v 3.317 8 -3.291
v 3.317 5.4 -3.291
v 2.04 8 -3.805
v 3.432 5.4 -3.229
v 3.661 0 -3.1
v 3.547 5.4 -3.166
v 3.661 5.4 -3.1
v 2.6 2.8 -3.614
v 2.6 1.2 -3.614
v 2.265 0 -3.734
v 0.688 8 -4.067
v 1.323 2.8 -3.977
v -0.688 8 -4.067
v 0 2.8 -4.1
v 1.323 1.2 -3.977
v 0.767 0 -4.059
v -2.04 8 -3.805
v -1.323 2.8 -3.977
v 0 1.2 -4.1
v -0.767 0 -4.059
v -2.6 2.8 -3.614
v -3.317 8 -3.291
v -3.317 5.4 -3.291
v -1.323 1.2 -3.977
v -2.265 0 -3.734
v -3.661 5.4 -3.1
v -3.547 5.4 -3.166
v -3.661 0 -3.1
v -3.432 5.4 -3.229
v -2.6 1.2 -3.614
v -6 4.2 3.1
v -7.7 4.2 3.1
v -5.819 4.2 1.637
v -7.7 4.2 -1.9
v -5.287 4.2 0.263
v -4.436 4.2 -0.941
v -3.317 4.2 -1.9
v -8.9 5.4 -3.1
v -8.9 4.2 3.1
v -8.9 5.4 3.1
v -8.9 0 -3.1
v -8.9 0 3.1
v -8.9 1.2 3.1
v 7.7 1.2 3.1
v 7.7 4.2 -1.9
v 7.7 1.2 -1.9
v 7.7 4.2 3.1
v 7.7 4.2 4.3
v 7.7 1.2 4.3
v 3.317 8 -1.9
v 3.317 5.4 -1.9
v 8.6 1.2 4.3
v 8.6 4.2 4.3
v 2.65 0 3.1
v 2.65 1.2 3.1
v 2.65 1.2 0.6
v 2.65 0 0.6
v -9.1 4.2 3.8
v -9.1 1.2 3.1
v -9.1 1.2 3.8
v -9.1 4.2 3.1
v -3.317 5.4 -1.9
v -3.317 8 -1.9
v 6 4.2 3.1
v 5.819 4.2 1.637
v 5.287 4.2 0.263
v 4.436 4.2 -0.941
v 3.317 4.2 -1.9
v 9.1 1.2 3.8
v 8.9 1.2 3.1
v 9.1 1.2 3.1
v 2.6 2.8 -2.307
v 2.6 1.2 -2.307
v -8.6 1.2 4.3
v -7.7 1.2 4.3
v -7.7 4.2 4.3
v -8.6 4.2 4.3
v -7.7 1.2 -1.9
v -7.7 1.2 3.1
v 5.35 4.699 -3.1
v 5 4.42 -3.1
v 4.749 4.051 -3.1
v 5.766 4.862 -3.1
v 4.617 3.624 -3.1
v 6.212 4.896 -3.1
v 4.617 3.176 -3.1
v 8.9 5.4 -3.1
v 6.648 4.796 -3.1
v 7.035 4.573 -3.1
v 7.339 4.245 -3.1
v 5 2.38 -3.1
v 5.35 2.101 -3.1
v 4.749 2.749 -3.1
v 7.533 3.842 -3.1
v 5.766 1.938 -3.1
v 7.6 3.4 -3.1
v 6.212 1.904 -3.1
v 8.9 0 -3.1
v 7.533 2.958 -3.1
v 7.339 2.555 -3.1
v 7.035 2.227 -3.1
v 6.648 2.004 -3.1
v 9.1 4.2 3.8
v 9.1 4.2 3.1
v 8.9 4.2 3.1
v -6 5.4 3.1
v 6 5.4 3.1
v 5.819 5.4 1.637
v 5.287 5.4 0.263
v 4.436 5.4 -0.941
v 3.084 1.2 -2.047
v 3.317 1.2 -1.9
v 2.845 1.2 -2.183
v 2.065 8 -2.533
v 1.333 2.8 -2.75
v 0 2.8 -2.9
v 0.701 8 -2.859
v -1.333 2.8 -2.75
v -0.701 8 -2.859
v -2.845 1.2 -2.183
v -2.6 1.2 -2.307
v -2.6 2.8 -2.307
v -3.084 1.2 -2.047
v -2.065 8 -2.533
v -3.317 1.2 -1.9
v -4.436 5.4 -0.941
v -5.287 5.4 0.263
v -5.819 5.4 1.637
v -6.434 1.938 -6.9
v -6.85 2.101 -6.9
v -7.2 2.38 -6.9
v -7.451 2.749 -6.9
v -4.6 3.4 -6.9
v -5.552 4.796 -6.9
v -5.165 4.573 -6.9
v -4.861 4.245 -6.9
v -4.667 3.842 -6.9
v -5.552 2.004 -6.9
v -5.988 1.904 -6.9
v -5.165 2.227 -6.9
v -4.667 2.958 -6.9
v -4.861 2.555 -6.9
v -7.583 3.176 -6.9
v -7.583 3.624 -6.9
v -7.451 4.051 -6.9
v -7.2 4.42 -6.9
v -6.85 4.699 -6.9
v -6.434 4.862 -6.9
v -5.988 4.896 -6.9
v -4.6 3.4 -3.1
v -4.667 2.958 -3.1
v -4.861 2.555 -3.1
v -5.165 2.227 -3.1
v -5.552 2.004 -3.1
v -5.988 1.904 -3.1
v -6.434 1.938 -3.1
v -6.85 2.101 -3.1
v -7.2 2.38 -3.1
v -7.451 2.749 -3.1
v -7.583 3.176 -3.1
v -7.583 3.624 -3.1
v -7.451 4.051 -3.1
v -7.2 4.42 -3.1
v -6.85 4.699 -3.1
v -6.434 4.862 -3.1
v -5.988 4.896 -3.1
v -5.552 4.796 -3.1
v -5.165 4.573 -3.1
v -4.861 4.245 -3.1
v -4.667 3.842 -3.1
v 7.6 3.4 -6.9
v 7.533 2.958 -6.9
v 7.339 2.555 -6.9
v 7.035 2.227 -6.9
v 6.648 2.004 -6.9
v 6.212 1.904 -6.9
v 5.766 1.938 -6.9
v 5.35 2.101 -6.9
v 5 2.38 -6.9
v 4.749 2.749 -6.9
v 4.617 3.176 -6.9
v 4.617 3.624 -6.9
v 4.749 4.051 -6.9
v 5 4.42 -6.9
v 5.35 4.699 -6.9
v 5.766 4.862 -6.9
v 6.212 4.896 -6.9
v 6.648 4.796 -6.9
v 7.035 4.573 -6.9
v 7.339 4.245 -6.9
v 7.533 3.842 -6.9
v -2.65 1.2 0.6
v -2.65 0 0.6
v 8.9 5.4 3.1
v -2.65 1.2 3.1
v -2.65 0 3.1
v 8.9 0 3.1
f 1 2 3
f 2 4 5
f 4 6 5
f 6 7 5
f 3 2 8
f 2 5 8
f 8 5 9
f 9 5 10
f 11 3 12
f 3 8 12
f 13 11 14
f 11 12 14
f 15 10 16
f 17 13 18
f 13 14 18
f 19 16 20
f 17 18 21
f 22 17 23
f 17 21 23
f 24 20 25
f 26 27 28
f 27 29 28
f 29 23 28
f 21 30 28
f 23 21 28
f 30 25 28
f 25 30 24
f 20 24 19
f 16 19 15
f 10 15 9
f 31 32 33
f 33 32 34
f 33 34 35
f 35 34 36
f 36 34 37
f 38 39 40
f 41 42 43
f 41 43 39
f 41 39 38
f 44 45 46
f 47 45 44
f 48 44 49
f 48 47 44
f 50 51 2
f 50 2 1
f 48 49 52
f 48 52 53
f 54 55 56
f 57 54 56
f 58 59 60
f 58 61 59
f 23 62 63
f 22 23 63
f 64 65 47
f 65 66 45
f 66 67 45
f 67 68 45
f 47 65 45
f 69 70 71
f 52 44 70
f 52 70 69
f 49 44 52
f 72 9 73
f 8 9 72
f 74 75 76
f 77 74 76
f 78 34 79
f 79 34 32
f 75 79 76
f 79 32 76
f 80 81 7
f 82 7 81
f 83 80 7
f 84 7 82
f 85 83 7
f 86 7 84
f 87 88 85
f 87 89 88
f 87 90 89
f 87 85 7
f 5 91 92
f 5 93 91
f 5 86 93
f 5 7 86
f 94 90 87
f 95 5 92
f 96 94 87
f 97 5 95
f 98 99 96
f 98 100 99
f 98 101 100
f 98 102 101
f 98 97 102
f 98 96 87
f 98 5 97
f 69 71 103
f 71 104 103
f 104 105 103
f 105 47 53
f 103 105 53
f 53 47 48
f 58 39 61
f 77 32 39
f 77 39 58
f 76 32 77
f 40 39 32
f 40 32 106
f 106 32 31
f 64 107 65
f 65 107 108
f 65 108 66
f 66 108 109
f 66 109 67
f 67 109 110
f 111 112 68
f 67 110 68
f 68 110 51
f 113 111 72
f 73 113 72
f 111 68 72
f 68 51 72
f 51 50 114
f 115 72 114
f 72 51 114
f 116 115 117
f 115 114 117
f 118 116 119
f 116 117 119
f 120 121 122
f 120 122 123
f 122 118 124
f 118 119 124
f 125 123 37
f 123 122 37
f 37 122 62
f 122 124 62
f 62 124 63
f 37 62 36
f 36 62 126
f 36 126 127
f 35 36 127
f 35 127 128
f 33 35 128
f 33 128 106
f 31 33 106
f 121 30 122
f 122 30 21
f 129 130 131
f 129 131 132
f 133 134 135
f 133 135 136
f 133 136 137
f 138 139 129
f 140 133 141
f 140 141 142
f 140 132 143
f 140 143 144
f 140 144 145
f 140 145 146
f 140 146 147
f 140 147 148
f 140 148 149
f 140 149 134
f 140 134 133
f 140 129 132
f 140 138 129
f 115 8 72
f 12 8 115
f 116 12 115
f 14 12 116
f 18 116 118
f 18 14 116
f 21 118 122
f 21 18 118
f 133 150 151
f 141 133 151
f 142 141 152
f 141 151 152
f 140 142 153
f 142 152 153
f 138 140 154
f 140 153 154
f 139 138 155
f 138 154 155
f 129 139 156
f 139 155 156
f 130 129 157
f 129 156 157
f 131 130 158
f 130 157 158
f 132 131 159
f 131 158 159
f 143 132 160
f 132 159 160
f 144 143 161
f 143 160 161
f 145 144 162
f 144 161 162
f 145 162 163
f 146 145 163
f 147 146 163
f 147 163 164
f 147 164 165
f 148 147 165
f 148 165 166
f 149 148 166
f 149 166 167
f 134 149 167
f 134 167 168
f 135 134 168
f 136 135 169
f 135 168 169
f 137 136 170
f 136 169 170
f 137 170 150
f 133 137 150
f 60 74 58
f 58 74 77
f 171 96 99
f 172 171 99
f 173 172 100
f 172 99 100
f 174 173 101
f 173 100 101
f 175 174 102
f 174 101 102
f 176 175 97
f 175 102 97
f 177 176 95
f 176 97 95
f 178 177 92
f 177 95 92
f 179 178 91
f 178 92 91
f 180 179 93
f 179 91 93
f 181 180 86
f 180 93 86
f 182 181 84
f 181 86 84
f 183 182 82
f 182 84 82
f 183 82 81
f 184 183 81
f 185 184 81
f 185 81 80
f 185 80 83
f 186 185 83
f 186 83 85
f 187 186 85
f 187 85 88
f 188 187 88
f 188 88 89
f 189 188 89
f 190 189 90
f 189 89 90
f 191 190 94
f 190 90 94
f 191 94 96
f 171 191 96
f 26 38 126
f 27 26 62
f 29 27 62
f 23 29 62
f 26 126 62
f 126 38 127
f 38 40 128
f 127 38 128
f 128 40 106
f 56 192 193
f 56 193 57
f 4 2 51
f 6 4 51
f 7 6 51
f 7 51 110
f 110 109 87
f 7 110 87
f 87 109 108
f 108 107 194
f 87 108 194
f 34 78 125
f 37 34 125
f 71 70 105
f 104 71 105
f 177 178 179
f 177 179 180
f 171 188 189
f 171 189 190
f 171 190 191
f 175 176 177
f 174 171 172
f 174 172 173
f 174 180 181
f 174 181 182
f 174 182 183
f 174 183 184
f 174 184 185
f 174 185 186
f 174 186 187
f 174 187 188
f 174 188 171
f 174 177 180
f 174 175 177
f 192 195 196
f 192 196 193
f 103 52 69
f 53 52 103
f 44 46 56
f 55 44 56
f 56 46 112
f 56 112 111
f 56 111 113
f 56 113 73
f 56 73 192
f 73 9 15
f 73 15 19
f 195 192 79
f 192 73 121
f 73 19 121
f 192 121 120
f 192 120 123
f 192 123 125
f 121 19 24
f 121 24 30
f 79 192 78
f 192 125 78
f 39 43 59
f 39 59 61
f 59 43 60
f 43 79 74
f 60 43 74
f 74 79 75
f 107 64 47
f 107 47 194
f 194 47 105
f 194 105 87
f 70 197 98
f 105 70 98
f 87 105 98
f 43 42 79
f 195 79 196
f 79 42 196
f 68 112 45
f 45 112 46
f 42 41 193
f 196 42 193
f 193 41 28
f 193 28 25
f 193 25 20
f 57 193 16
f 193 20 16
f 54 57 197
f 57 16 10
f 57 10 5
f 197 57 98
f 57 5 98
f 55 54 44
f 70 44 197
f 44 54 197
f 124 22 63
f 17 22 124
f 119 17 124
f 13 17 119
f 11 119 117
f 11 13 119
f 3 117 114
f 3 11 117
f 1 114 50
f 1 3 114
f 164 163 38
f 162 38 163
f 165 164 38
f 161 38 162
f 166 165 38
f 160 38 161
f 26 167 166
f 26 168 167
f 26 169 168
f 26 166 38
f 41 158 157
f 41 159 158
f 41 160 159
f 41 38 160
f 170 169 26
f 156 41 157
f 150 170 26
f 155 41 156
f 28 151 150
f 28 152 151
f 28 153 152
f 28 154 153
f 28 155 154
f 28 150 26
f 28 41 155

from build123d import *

# Parameters (mm, degrees)
SKETCH1_W                = 17.8
SKETCH1_H                = 6.2
BOSS_EXTRUDE1_DEPTH      = 5.4
SHELL1_T                 = -1.2
SKETCH2_W                = 6
SKETCH2_H                = 4.2
REVOLVE1_DEPTH           = 8
SKETCH5_W                = 1.864108749
SKETCH5_H                = 2.6
CUT_EXTRUDE1_DEPTH       = 5.4
SKETCH6_W                = 5.2
SKETCH6_H                = 1.6
CUT_EXTRUDE2_DEPTH       = 2.7
SKETCH7_R                = 1.5
BOSS_EXTRUDE2_DEPTH      = 3.8
SKETCH8_W                = 1.2
SKETCH8_H                = 3
BOSS_EXTRUDE3_DEPTH      = 1.4
CHAMFER1_SIZE            = 0.5
CHAMFER1_OF_MIRROR1_SIZE = 0.5
SKETCH9_W                = 5.3
SKETCH9_H                = 2.5
CUT_EXTRUDE3_DEPTH       = 5


# Read off the part's stored shape, not the designer's step: Revolve1
with BuildPart() as part:
    # Sketch1 → Boss-Extrude1 (new body)
    with BuildSketch(Plane(origin=(0, 0, 0), x_dir=(1, 0, 0), z_dir=(0, 1, 0))):
        Rectangle(SKETCH1_W, SKETCH1_H)
    extrude(amount=BOSS_EXTRUDE1_DEPTH)

    # Shell1
    shell1_openings = [part.faces().sort_by_distance(p)[0] for p in [
        (0, 2.7, 3.1),
    ]]
    offset(amount=SHELL1_T, openings=shell1_openings, kind=Kind.INTERSECTION)

    # Sketch2 → Cut-Revolve1 (revolve, cut)
    with BuildSketch(Plane.XY.offset(3.1)):
        with Locations((3, 3.3)):
            Rectangle(SKETCH2_W, SKETCH2_H)
    revolve(axis=Axis((0, 1.2, 3.1), (0, 1, 0)), mode=Mode.SUBTRACT)

    # Revolve1 outline → Revolve1 (add)
    with BuildSketch(Plane(origin=(0, 0, 0), x_dir=(1, 0, 0), z_dir=(0, 1, 0))):
        with BuildLine():
            Line((-5.180733539, 1.9), (-3.31662479, 1.9))
            ThreePointArc((-3.31662479, 1.9), (0, 2.9), (3.31662479, 1.9))
            Line((3.31662479, 1.9), (5.180733539, 1.9))
            ThreePointArc((5.180733539, 1.9), (0, 4.1), (-5.180733539, 1.9))
        make_face()
    extrude(amount=REVOLVE1_DEPTH)

    # Sketch5 → Cut-Extrude1 (cut)
    with BuildSketch(Plane.XY.offset(-1.9)):
        with Locations((-4.248679165, 6.7)):
            Rectangle(SKETCH5_W, SKETCH5_H)
        with Locations((4.248679165, 6.7)):
            Rectangle(SKETCH5_W, SKETCH5_H)
    extrude(amount=-CUT_EXTRUDE1_DEPTH, mode=Mode.SUBTRACT)

    # Sketch6 → Cut-Extrude2 (cut, symmetric)
    with BuildSketch(Plane(origin=(0, 0, -3.1), x_dir=(-1, 0, 0), z_dir=(0, 0, -1))):
        with Locations((0, 2)):
            Rectangle(SKETCH6_W, SKETCH6_H)
    extrude(amount=CUT_EXTRUDE2_DEPTH, both=True, mode=Mode.SUBTRACT)

    # Sketch7 → Boss-Extrude2 (add)
    with BuildSketch(Plane(origin=(0, 0, -3.1), x_dir=(-1, 0, 0), z_dir=(0, 0, -1))):
        with Locations(Location((6.1, 3.4, 0), (0, 0, 180))):
            Circle(SKETCH7_R)
        with Locations(Location((-6.1, 3.4, 0), (0, 0, 180))):
            Circle(SKETCH7_R)
    extrude(amount=BOSS_EXTRUDE2_DEPTH)

    # Sketch8 → Boss-Extrude3 (add)
    with BuildSketch(Plane.ZY.offset(-7.7)):
        with Locations((3.7, 2.7)):
            Rectangle(SKETCH8_W, SKETCH8_H)
    boss_extrude3 = extrude(amount=-BOSS_EXTRUDE3_DEPTH)

    # Chamfer1
    chamfer1_edges = [part.edges().sort_by_distance(p)[0] for p in [
        (9.1, 2.7, 4.3),
    ]]
    chamfer(chamfer1_edges, length=CHAMFER1_SIZE)

    # Mirror1: Boss-Extrude3 across plane
    add(boss_extrude3.mirror(Plane(origin=(0, 0, 0), x_dir=(0, 0, 1), z_dir=(1, 0, 0))))

    # Chamfer1 of Mirror1
    chamfer1_of_mirror1_edges = [part.edges().sort_by_distance(p)[0] for p in [
        (-9.1, 2.7, 4.3),
    ]]
    chamfer(chamfer1_of_mirror1_edges, length=CHAMFER1_OF_MIRROR1_SIZE)

    # Sketch9 → Cut-Extrude3 (cut, symmetric)
    with BuildSketch(Plane(origin=(0, 1.2, 0), x_dir=(1, 0, 0), z_dir=(0, 1, 0))):
        with Locations((0, -1.85)):
            Rectangle(SKETCH9_W, SKETCH9_H)
    extrude(amount=CUT_EXTRUDE3_DEPTH, both=True, mode=Mode.SUBTRACT)


solid = part.part
